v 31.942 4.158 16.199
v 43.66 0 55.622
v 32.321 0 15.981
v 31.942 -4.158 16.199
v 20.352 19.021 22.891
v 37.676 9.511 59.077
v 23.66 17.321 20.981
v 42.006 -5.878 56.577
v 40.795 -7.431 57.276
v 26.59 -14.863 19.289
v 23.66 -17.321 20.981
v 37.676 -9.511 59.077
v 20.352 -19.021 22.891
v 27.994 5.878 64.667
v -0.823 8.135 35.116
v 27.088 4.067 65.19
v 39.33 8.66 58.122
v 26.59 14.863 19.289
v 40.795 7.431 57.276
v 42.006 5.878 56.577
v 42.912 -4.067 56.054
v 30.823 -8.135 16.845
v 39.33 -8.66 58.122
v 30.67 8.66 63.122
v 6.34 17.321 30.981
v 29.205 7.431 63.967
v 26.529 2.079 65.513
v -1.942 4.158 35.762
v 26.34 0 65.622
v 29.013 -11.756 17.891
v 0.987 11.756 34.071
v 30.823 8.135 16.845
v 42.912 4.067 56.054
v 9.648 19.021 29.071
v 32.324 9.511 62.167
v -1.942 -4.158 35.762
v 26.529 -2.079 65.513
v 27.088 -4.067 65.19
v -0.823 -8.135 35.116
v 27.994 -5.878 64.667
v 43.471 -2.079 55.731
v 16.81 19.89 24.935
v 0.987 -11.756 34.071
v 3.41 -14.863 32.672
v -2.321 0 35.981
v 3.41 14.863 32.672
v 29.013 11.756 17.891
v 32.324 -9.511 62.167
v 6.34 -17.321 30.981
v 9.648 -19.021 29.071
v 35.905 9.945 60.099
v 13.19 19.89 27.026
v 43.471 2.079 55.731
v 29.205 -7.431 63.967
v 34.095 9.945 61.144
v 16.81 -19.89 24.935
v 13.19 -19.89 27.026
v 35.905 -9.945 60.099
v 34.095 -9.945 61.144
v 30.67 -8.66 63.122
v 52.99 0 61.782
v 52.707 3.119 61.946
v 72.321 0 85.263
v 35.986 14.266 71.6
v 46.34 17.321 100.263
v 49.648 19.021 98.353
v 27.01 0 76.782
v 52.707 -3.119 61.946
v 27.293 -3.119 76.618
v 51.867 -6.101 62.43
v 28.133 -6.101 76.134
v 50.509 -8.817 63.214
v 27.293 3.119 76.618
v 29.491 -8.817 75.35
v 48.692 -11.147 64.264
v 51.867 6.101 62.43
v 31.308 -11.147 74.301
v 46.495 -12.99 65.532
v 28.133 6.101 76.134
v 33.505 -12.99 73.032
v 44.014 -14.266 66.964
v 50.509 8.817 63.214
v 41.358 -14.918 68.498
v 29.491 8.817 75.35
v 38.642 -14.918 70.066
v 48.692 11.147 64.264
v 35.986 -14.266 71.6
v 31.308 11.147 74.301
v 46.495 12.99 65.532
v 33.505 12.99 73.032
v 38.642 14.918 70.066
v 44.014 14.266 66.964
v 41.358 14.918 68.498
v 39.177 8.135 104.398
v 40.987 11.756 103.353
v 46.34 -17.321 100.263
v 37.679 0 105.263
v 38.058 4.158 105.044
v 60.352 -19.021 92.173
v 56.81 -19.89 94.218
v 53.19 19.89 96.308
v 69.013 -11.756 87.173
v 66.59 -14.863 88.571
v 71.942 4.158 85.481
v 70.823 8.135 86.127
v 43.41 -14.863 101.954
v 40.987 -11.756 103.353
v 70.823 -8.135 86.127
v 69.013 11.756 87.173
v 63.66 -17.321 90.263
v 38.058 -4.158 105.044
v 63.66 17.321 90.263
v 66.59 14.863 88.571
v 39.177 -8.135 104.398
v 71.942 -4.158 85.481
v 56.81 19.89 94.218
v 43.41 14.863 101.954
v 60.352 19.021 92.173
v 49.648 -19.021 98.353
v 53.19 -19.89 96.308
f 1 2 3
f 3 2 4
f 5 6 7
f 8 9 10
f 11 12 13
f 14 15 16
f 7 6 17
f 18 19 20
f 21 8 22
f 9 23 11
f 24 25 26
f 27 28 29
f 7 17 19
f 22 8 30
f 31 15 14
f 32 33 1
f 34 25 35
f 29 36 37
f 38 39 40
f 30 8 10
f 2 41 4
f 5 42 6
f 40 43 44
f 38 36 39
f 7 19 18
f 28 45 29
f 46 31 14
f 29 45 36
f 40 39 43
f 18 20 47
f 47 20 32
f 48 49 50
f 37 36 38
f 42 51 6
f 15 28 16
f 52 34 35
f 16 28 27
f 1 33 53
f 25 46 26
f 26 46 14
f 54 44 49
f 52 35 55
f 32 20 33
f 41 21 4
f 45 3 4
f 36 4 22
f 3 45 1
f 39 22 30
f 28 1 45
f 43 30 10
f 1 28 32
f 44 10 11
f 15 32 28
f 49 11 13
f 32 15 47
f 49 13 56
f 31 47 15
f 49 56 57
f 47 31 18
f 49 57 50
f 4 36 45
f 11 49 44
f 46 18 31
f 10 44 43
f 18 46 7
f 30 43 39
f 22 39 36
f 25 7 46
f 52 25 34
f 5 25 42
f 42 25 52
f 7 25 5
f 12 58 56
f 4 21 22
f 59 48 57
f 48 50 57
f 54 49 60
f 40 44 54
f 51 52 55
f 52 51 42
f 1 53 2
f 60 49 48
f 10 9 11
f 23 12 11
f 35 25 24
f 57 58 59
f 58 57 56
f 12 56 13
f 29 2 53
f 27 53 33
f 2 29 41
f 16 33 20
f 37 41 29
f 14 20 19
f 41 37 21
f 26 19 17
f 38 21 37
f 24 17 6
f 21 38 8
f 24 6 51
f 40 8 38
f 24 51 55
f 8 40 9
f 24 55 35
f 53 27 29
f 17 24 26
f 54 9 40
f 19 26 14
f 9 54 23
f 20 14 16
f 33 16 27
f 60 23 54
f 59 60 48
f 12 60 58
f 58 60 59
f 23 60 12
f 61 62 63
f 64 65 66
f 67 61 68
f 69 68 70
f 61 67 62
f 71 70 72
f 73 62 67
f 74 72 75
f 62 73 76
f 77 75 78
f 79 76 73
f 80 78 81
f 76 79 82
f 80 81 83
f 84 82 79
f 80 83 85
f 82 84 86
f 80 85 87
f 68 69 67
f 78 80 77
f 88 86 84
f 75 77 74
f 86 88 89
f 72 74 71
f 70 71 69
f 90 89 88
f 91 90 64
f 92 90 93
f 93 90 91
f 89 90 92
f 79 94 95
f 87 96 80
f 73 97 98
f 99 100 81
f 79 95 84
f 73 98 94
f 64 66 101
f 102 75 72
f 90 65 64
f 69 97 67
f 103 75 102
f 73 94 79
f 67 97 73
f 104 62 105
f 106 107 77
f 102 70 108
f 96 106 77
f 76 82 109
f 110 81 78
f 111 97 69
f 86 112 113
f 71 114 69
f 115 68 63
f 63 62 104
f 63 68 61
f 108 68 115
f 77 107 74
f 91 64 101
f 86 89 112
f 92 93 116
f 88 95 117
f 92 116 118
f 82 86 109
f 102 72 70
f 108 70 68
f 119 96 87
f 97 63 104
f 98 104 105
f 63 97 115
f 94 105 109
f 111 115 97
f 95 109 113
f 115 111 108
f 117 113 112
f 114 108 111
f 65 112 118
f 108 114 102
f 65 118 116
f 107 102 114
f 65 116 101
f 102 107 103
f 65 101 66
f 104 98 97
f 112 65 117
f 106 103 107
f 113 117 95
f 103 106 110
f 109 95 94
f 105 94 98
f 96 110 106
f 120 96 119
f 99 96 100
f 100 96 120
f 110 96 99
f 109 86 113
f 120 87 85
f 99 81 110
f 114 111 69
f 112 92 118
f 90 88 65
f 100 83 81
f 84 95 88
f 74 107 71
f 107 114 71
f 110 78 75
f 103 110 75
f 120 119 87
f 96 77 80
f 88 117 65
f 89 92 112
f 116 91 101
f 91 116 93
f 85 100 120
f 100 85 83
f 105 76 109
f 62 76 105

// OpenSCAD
     rotate(30,[0,1,0]){
	       {
	       translate([0,0,30]) cylinder(h=40,r1=20,r2=10, center = false);
	       translate([0,0,80]) cylinder(h=30,r1=15,r2=20,center = false);
	       }}
